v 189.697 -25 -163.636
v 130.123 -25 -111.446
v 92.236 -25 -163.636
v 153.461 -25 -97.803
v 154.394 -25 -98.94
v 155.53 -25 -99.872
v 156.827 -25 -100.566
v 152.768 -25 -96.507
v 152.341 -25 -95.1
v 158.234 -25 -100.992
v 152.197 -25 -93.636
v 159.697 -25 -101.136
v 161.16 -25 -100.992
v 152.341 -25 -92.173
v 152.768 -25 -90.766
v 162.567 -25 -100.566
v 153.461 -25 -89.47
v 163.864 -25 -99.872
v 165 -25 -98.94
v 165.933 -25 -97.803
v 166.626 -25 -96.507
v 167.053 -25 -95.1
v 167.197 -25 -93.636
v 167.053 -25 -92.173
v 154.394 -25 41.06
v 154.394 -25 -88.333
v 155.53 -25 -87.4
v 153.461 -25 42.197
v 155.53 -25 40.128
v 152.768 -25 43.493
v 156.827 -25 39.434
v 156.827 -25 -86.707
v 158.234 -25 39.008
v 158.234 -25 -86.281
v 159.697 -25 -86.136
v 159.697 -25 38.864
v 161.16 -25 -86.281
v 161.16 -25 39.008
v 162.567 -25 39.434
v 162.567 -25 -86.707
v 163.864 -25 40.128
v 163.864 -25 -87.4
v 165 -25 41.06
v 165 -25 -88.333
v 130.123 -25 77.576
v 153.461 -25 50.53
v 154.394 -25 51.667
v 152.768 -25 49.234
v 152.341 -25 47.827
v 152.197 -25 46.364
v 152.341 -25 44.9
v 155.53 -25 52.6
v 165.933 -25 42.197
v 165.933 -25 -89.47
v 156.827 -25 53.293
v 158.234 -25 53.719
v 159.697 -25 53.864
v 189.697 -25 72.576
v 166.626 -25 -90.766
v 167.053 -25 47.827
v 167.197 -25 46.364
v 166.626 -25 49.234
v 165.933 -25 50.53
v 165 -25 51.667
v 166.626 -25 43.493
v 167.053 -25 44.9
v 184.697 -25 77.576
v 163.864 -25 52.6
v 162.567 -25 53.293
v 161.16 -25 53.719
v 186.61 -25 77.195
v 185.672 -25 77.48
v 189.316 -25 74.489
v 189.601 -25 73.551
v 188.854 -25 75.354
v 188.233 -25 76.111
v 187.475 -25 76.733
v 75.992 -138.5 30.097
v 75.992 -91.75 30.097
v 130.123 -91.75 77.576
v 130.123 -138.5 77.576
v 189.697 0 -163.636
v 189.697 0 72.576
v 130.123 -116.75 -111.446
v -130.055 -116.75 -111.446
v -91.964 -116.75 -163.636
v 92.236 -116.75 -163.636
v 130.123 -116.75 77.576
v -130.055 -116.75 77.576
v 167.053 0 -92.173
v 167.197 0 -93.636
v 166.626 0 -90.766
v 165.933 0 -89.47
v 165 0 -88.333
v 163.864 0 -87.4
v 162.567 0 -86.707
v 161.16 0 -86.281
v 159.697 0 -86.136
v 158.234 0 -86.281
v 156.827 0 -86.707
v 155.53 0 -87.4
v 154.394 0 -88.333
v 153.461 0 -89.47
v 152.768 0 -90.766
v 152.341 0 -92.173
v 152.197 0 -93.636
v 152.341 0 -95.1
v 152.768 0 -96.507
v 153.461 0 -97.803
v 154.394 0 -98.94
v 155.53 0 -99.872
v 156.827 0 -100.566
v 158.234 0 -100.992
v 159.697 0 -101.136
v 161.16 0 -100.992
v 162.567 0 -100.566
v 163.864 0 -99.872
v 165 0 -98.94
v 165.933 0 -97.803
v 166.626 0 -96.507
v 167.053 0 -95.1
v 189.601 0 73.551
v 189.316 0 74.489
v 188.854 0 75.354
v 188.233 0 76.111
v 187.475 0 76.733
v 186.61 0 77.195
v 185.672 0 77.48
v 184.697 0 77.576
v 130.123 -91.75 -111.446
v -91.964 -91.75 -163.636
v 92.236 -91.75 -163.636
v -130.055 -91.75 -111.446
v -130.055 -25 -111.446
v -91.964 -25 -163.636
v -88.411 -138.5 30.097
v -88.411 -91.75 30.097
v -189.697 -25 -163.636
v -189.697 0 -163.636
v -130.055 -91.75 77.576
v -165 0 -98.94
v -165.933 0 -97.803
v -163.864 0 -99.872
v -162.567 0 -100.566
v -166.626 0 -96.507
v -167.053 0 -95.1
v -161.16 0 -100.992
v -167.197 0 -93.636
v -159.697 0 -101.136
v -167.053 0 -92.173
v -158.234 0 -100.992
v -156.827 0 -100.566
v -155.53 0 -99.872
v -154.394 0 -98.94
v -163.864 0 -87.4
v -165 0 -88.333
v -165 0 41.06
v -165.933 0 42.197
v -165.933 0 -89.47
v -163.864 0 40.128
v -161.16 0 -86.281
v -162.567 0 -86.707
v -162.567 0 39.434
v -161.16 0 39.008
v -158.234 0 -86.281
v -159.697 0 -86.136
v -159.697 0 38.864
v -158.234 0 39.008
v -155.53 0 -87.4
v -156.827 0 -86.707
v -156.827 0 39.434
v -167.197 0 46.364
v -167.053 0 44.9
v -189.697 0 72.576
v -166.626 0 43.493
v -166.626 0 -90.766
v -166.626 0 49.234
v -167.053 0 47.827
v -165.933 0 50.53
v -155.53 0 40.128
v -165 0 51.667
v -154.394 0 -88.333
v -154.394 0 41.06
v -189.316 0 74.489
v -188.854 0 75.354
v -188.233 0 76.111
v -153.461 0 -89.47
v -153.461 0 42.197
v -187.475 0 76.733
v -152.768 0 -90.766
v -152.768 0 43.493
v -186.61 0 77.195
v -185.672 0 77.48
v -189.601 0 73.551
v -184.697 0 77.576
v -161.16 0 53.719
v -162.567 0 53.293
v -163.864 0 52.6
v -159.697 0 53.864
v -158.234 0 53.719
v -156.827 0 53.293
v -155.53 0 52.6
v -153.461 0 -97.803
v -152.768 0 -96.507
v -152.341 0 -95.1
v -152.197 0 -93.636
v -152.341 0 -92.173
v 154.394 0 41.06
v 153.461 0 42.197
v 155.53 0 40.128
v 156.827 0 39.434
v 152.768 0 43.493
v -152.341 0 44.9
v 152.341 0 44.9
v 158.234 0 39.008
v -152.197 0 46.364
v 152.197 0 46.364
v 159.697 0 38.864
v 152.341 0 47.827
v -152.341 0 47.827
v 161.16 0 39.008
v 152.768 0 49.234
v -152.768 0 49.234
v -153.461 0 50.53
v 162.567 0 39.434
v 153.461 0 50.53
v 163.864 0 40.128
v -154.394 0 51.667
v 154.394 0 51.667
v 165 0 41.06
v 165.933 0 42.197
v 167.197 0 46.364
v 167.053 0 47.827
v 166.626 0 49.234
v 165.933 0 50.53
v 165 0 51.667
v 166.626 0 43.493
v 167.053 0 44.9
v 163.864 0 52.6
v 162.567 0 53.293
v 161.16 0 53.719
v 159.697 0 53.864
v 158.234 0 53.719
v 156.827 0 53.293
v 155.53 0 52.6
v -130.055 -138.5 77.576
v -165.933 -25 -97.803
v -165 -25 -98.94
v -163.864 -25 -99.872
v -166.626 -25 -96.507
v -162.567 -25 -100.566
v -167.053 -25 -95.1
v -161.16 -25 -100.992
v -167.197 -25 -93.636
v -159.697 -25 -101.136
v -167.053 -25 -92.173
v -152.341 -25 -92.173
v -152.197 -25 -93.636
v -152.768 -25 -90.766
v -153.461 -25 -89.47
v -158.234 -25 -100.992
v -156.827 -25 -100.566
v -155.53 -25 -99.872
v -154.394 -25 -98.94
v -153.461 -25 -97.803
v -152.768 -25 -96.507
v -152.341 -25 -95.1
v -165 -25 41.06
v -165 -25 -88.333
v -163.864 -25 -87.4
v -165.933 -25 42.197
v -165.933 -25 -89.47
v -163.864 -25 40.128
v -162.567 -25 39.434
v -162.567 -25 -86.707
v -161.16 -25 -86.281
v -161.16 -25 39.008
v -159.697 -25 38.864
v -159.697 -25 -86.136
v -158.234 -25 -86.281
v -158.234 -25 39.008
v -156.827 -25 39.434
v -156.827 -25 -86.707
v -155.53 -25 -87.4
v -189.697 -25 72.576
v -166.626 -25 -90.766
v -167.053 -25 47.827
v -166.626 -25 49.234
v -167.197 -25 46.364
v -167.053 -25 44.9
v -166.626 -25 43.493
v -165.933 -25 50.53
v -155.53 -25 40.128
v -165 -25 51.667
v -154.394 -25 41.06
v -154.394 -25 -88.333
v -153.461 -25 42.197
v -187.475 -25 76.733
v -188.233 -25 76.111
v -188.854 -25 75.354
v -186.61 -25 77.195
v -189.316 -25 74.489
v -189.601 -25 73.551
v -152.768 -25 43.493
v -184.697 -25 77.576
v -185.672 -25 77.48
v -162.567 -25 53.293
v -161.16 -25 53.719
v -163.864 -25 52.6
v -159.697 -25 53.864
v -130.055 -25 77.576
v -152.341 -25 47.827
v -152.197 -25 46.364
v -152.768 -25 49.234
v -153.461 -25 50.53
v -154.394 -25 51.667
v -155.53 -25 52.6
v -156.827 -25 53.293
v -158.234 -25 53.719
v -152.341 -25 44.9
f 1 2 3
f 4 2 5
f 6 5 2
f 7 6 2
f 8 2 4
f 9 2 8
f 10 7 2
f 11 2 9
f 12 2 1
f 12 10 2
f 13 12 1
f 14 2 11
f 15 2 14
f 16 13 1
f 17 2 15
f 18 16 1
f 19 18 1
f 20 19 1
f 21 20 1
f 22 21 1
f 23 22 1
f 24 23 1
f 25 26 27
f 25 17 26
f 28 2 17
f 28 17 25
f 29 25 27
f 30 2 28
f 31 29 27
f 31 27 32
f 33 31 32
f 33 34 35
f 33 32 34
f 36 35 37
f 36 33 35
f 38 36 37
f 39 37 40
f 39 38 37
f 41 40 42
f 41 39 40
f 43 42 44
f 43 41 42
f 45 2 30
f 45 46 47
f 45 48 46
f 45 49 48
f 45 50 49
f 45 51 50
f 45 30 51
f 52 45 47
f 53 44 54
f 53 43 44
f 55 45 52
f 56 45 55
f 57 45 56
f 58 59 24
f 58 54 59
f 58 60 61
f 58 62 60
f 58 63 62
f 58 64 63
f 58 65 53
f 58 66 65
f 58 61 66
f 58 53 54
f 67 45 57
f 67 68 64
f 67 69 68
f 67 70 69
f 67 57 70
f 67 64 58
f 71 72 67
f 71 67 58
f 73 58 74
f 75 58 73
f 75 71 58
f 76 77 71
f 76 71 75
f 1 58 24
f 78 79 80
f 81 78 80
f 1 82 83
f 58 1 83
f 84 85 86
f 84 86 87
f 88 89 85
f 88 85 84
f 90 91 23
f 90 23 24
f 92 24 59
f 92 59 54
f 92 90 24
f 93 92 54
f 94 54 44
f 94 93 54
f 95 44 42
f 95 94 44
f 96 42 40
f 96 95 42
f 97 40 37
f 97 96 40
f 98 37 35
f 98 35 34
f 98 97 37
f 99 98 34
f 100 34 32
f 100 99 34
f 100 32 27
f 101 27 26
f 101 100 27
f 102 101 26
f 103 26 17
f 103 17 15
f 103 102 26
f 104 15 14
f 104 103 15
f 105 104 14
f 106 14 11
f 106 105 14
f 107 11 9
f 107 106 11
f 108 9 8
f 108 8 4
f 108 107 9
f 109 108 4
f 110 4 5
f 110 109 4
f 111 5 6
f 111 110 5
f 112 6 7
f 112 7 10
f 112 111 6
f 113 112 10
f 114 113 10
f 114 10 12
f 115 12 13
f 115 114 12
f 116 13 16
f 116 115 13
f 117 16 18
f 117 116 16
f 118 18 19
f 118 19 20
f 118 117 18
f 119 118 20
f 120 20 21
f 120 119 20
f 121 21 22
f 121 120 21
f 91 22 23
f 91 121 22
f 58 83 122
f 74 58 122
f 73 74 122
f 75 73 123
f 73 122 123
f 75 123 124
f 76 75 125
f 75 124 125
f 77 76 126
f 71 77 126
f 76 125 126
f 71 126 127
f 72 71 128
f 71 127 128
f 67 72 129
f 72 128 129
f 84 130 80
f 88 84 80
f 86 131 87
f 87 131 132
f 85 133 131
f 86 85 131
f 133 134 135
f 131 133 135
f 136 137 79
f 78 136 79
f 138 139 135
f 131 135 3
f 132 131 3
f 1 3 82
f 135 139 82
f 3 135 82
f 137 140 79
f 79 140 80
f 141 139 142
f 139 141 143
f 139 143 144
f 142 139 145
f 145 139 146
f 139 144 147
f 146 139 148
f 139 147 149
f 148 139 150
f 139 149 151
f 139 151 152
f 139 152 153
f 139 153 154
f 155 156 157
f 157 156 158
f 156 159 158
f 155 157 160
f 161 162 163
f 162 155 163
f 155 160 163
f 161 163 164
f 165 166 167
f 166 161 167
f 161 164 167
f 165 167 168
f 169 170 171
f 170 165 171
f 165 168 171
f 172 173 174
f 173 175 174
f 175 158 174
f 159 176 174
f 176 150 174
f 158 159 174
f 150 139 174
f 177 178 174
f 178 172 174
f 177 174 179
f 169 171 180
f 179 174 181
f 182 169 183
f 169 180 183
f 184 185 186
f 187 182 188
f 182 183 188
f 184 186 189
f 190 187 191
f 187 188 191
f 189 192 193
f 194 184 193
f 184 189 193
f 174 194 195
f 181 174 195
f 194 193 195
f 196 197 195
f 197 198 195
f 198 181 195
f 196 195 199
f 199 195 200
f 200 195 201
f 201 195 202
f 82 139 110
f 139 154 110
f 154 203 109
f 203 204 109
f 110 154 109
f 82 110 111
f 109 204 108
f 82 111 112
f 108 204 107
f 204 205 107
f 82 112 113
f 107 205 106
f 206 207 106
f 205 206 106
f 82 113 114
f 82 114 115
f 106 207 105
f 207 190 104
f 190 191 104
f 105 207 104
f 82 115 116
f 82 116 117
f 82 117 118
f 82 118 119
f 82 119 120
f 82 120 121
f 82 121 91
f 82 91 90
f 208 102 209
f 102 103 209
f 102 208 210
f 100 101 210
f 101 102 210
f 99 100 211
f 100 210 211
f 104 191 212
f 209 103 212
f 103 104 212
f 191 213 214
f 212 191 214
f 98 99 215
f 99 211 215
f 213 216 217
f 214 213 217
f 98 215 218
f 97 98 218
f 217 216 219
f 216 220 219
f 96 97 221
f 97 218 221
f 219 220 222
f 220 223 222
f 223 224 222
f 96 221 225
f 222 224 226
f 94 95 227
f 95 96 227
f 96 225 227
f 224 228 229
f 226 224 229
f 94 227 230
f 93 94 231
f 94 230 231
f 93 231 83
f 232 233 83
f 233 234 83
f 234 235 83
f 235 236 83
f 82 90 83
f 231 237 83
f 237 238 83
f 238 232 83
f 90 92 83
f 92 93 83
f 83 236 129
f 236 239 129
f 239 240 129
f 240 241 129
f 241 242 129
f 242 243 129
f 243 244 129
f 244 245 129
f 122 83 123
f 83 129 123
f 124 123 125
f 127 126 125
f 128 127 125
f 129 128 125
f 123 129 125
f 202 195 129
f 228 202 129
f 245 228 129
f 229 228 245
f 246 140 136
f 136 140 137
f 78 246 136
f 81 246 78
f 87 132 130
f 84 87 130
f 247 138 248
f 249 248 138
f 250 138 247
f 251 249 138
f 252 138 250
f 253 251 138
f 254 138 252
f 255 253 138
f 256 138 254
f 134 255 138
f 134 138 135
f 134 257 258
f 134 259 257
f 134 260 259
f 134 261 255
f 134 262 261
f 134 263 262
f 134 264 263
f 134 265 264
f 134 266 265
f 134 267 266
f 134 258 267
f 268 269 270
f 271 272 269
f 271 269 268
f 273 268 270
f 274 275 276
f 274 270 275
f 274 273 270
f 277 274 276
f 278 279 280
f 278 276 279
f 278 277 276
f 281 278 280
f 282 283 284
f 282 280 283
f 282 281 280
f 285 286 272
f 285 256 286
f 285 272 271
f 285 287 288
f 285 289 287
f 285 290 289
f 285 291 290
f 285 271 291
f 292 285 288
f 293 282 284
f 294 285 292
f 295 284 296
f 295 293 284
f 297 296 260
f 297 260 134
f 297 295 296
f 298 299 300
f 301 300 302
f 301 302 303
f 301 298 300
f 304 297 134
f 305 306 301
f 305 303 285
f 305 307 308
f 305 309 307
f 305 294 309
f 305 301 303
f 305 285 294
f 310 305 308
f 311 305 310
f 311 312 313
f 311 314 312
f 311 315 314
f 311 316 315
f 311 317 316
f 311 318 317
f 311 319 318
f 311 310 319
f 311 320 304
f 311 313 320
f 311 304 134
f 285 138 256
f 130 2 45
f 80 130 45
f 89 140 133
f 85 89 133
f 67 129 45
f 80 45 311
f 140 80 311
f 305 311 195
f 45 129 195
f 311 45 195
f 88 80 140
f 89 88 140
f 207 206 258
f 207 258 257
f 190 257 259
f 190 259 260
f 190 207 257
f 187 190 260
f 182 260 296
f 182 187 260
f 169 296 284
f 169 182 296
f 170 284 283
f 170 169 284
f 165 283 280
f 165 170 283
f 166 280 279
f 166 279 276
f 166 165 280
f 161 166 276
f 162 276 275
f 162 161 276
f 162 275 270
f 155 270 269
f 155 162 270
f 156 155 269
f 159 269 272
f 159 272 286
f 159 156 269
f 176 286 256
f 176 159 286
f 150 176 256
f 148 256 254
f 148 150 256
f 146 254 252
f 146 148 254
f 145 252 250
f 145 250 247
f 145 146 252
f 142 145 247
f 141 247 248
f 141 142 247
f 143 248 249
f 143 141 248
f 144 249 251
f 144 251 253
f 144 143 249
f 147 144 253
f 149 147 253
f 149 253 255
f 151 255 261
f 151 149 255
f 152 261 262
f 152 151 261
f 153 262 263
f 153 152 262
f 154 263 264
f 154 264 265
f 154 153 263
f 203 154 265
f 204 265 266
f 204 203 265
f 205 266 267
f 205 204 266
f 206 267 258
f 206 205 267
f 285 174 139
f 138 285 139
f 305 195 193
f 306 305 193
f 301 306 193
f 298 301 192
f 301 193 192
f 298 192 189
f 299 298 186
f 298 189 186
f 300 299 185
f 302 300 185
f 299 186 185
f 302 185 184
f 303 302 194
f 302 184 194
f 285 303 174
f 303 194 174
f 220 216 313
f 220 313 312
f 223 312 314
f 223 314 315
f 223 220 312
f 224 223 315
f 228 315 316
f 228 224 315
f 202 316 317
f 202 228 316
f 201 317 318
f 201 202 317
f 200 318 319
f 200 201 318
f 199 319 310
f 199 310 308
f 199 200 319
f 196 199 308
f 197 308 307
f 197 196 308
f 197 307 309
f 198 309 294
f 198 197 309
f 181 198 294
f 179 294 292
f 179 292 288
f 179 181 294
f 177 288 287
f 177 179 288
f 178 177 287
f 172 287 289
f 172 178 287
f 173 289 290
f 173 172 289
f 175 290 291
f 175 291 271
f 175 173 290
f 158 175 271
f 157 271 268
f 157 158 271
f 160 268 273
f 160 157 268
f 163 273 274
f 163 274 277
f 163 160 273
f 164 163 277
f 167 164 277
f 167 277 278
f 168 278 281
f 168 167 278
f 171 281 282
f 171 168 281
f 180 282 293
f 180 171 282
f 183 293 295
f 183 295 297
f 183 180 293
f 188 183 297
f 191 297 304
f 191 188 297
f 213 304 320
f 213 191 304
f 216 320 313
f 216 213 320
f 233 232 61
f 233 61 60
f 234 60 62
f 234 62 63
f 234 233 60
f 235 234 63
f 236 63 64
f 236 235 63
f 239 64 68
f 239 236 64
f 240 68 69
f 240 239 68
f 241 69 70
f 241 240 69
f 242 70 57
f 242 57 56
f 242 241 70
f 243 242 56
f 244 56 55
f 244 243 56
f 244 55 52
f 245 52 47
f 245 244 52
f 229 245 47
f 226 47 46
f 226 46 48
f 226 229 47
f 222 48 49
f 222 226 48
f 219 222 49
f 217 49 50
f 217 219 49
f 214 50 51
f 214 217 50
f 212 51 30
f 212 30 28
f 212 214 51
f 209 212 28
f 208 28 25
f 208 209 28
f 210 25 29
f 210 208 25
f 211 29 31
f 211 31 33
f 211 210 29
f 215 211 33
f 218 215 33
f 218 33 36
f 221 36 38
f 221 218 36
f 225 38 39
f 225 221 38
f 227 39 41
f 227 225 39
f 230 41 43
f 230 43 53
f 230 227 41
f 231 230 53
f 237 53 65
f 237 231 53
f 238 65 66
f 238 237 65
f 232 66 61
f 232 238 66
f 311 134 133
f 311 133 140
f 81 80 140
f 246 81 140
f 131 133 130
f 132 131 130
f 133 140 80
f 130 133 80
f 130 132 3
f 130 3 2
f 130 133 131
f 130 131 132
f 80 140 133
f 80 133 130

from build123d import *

# Parameters (mm, degrees)
F0_R     = 7.5
F1_DEPTH = 25
F2_W     = 260.1785361767
F2_H     = 189.0219330167
F3_DEPTH = 42.5
F4_DEPTH = 66.75
F6_DEPTH = 46.75
F8_DEPTH = 25


with BuildPart() as f1:
    # F0 (on Front) → F1 (new body)
    with BuildSketch(Plane.XZ):
        Polygon((129.6970205473, -123.6364181716), (129.6970205473, -77.5757833694), (-129.6970205473, -77.5757833694), (-129.6970205473, -123.6364181716), (-129.6970205473, -163.6364181716), (129.6970205473, -163.6364181716), align=None)
        with BuildLine():
            Line((-129.6970205473, -77.5757833694), (129.6970205473, -77.5757833694))
            Line((129.6970205473, -77.5757833694), (129.6970205473, 77.5757833694))
            Line((129.6970205473, 77.5757833694), (76.9282222731, 77.5757833694))
            ThreePointArc((76.9282222731, 77.5757833694), (0, 0.6475610963), (-76.9282222731, 77.5757833694))
            Line((-76.9282222731, 77.5757833694), (-129.6970205473, 77.5757833694))
            Line((-129.6970205473, 77.5757833694), (-129.6970205473, -77.5757833694))
        make_face()
        with BuildLine():
            Line((129.6970205473, 77.5757833694), (129.6970205473, -77.5757833694))
            Line((129.6970205473, -77.5757833694), (129.6970205473, -123.6364181716))
            Line((129.6970205473, -123.6364181716), (129.6970205473, -163.6364181716))
            Line((129.6970205473, -163.6364181716), (189.6970205473, -163.6364181716))
            Line((189.6970205473, -163.6364181716), (189.6970205473, -123.6364181716))
            Line((189.6970205473, -123.6364181716), (189.6970205473, 72.5757833694))
            ThreePointArc((189.6970205473, 72.5757833694), (188.2325544533, 76.1113172754), (184.6970205473, 77.5757833694))
            Line((184.6970205473, 77.5757833694), (129.6970205473, 77.5757833694))
        make_face()
        with Locations((159.6970205473, -93.6364181716)):
            Circle(F0_R, mode=Mode.SUBTRACT)
        with Locations((159.6970205473, 46.3635818284)):
            Circle(F0_R, mode=Mode.SUBTRACT)
        with BuildLine():
            Line((-129.6970205473, -123.6364181716), (-129.6970205473, -77.5757833694))
            Line((-129.6970205473, -77.5757833694), (-129.6970205473, 77.5757833694))
            Line((-129.6970205473, 77.5757833694), (-184.6970205473, 77.5757833694))
            ThreePointArc((-184.6970205473, 77.5757833694), (-188.2325544533, 76.1113172754), (-189.6970205473, 72.5757833694))
            Line((-189.6970205473, 72.5757833694), (-189.6970205473, -123.6364181716))
            Line((-189.6970205473, -123.6364181716), (-189.6970205473, -163.6364181716))
            Line((-189.6970205473, -163.6364181716), (-129.6970205473, -163.6364181716))
            Line((-129.6970205473, -163.6364181716), (-129.6970205473, -123.6364181716))
        make_face()
        with Locations((-159.6970205473, -93.6364181716)):
            Circle(F0_R, mode=Mode.SUBTRACT)
        with Locations((-159.6970205473, 46.3635818284)):
            Circle(F0_R, mode=Mode.SUBTRACT)
        with BuildLine():
            ThreePointArc((-76.9282222731, 77.5757833694), (0, 0.6475610963), (76.9282222731, 77.5757833694))
            Line((76.9282222731, 77.5757833694), (-76.9282222731, 77.5757833694))
        make_face()
    extrude(amount=F1_DEPTH)

    # F2 (on face) → F3 (join)
    with BuildSketch(Plane.XZ.offset(25)):
        with Locations((0.0338703394, -16.9351831389)):
            Rectangle(F2_W, F2_H)
    extrude(amount=F3_DEPTH)

    # F2 (on face) → F4 (join)
    with BuildSketch(Plane.XZ.offset(25)):
        with Locations((0.0338703394, -16.9351831389)):
            Rectangle(F2_W, F2_H)
        Polygon((130.1231384277, -111.4461496472), (-130.0553977489, -111.4461496472), (-91.9635742903, -163.6364181716), (92.2359377146, -163.6364181716), align=None)
    extrude(amount=F4_DEPTH)


with BuildPart() as f6:
    # F5 (on face) → F6 (new body)
    with BuildSketch(Plane.XZ.offset(91.75)):
        Polygon((130.1231384277, 77.5757833694), (-130.0553977489, 77.5757833694), (-88.4110927582, 30.0969909877), (75.9924301225, 30.0969909877), align=None)
    extrude(amount=F6_DEPTH)


with BuildPart() as f8:
    # F7 (on face) → F8 (new body)
    with BuildSketch(Plane.XZ.offset(91.75)):
        Polygon((-130.0553977489, -111.4461496472), (-91.9635742903, -163.6364181716), (92.2359377146, -163.6364181716), (130.1231384277, -111.4461496472), (130.1231384277, 77.5757833694), (-130.0553977489, 77.5757833694), align=None)
    extrude(amount=F8_DEPTH)


solid = Compound([f1.part, f6.part, f8.part])
